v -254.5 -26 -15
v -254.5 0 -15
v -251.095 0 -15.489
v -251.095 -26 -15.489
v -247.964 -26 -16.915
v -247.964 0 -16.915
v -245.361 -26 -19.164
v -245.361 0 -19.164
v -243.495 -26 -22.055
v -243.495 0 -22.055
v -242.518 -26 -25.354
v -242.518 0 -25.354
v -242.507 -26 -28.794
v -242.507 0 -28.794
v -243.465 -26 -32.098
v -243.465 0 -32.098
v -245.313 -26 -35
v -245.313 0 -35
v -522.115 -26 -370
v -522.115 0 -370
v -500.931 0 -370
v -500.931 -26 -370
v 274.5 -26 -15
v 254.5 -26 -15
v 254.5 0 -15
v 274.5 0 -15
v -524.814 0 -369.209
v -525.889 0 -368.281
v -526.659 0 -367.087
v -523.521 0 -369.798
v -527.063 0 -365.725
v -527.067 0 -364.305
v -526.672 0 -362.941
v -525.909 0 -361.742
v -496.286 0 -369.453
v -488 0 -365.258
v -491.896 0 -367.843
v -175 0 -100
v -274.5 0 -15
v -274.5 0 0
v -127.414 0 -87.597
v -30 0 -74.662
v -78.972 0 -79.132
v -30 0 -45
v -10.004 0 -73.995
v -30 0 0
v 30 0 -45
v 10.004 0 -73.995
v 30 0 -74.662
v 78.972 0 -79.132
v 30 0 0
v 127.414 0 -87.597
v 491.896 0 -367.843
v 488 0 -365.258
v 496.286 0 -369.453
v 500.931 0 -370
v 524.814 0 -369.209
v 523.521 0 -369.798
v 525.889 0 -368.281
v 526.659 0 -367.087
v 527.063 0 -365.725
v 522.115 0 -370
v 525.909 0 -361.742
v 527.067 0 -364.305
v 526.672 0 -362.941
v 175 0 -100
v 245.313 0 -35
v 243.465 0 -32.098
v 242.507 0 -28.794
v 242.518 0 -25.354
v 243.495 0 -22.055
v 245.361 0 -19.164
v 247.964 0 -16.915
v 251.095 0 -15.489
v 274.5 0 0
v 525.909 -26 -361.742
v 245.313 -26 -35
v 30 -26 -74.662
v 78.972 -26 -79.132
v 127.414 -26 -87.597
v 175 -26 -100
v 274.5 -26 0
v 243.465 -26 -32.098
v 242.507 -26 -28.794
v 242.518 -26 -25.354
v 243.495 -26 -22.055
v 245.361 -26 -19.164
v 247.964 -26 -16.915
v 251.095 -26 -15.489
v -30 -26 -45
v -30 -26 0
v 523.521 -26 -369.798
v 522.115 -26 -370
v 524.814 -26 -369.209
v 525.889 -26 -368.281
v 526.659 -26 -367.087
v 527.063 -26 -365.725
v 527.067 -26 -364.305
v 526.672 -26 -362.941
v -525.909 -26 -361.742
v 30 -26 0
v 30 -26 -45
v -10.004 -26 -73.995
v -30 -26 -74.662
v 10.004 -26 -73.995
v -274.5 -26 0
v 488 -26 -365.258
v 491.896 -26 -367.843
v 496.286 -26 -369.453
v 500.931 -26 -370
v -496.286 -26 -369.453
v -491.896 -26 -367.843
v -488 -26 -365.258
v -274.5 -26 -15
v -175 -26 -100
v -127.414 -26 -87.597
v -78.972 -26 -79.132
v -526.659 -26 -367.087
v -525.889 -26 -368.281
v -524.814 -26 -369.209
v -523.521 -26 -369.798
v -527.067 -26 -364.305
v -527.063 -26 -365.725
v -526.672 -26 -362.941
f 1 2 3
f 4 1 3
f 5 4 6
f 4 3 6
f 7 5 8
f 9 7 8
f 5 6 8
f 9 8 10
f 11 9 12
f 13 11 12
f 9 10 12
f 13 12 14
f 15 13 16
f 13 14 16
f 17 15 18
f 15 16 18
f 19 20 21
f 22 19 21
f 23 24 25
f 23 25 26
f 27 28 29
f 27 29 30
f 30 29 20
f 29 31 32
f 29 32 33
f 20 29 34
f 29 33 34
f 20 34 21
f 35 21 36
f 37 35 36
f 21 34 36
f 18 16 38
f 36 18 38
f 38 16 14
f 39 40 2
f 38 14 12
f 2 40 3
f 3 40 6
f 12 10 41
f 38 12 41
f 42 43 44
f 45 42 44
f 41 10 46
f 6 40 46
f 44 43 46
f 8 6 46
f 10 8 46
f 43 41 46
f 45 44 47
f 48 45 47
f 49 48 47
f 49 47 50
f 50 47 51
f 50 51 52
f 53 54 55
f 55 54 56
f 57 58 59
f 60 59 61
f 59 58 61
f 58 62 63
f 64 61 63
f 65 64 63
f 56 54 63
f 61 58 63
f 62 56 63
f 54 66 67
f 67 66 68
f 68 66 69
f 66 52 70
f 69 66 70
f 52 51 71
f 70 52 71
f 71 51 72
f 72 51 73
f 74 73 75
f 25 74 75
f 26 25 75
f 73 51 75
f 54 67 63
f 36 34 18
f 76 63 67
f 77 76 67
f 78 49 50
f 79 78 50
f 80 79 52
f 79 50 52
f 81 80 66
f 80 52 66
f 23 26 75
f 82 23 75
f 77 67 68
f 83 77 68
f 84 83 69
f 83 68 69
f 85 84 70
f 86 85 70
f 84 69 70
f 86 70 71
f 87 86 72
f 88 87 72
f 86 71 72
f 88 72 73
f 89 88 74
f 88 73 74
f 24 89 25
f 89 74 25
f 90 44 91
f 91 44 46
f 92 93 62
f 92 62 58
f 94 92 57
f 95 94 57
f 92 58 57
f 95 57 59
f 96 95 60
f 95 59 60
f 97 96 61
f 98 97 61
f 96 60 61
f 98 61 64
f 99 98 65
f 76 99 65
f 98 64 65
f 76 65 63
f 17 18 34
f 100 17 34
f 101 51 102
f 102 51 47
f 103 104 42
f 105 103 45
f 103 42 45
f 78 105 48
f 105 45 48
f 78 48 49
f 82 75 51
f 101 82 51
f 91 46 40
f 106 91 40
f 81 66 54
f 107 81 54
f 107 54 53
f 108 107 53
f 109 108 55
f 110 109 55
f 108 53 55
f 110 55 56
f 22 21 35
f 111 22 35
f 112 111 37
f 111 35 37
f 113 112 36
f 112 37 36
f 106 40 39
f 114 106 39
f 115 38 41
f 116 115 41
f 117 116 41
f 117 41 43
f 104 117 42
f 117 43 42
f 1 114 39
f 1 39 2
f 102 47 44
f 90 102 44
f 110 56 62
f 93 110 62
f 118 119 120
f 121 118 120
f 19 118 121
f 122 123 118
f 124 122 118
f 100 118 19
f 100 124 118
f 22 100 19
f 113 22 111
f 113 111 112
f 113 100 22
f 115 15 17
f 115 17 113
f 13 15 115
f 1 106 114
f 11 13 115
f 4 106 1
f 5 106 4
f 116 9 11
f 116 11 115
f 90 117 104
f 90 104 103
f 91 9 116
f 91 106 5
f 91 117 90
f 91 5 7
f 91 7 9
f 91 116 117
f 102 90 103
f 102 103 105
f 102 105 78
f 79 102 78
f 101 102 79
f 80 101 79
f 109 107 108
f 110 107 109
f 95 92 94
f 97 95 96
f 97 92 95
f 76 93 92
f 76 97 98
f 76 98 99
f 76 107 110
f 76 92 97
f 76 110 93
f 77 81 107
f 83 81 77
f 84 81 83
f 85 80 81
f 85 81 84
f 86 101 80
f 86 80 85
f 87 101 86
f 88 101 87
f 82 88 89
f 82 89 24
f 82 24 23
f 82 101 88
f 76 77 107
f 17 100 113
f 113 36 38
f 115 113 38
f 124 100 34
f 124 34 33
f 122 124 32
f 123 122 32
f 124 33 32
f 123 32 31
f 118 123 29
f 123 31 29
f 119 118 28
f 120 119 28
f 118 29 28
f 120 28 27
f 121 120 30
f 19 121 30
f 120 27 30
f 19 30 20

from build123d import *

# Parameters (mm, degrees)
F1_DEPTH = 26


with BuildPart() as f1:
    # F0 (on Front) → F1 (new body)
    with BuildSketch(Plane.XZ):
        with BuildLine():
            ThreePointArc((522.115478, -370), (526.65902, -367.087157), (525.908713, -361.74249))
            Line((525.908713, -361.74249), (245.312642, -35))
            ThreePointArc((245.312642, -35), (243.49537, -22.055015), (254.5, -15))
            Line((254.5, -15), (274.5, -15))
            Line((274.5, -15), (274.5, 0))
            Line((274.5, 0), (30, 0))
            Line((30, 0), (30, -45))
            Line((30, -45), (-30, -45))
            Line((-30, -45), (-30, 0))
            Line((-30, 0), (-274.5, 0))
            Line((-274.5, 0), (-274.5, -15))
            Line((-274.5, -15), (-254.5, -15))
            ThreePointArc((-254.5, -15), (-243.49537, -22.055015), (-245.312642, -35))
            Line((-245.312642, -35), (-525.908713, -361.74249))
            ThreePointArc((-525.908713, -361.74249), (-526.65902, -367.087157), (-522.115478, -370))
            Line((-522.115478, -370), (-500.930536, -370))
            ThreePointArc((-500.930536, -370), (-494.044191, -368.777067), (-488, -365.257826))
            Line((-488, -365.257826), (-175, -100))
            ThreePointArc((-175, -100), (-103.279947, -82.867809), (-30, -74.662483))
            ThreePointArc((-30, -74.662483), (0, -73.912014), (30, -74.662483))
            ThreePointArc((30, -74.662483), (103.279947, -82.867809), (175, -100))
            Line((175, -100), (488, -365.257826))
            ThreePointArc((488, -365.257826), (494.044191, -368.777067), (500.930536, -370))
            Line((500.930536, -370), (522.115478, -370))
        make_face()
    extrude(amount=F1_DEPTH)


solid = f1.part
